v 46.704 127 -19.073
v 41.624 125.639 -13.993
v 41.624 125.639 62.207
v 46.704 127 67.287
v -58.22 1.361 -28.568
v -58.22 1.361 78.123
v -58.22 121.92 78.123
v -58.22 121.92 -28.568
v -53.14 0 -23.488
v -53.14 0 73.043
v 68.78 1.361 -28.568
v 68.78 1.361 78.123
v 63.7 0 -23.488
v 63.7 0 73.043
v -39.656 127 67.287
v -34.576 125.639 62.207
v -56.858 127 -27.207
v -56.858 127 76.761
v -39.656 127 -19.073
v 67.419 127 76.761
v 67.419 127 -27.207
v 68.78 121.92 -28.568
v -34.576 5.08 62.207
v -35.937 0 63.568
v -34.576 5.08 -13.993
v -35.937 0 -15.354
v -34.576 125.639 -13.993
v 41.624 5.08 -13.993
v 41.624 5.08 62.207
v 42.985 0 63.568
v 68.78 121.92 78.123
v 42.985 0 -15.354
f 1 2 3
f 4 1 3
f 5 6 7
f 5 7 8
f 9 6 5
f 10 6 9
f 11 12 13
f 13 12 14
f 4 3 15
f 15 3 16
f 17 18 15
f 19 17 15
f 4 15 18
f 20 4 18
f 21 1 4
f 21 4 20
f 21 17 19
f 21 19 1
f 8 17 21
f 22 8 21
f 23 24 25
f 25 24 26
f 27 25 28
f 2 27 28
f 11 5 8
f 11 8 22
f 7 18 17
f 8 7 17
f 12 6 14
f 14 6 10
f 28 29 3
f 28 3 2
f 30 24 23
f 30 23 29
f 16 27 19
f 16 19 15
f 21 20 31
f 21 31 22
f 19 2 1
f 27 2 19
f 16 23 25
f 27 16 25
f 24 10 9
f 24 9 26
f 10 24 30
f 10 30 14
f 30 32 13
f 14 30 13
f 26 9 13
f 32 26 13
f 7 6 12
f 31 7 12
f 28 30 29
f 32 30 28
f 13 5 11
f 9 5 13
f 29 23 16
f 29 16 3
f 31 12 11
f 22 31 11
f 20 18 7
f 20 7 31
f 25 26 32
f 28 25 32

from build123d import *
from OCP.BRepFilletAPI import BRepFilletAPI_MakeChamfer

# Parameters (mm, degrees)
SKETCH1_W           = 127
SKETCH1_H           = 106.690831556
BOSS_EXTRUDE1_DEPTH = 127
SKETCH3_W           = 76.2
SKETCH3_H           = 76.2
CUT_EXTRUDE1_DEPTH  = 165.203782008
CHAMFER1_SIZE       = 5.08
CHAMFER1_SIZE2      = 1.361181898


with BuildPart() as part:
    # Sketch1 → Boss-Extrude1 (new body)
    with BuildSketch(Plane(origin=(0, 0, 0), x_dir=(1, 0, 0), z_dir=(0, 1, 0))):
        with Locations((5.280383795, -24.777185501)):
            Rectangle(SKETCH1_W, SKETCH1_H)
    extrude(amount=BOSS_EXTRUDE1_DEPTH)

    # Sketch3 → Cut-Extrude1 (cut, through all)
    with BuildSketch(Plane(origin=(0, 0, 0), x_dir=(1, 0, 0), z_dir=(0, 1, 0))):
        with Locations((3.524009173, -24.106880488)):
            Rectangle(SKETCH3_W, SKETCH3_H)
    extrude(amount=CUT_EXTRUDE1_DEPTH, mode=Mode.SUBTRACT)

    # Chamfer1: one chamfer whose edges measure the first distance from different faces: ONE call of the kernel's chamfer builder (chamfer() names one face for all edges)
    chamfer1_edges_1 = [part.edges().sort_by_distance(p)[0] for p in [
        (68.780383795, 127, 24.777185501),
    ]]
    chamfer1_side_1 = [part.faces().sort_by_distance(p)[0] for p in [
        (68.780383795, 63.5, 24.777185501),
    ]]
    chamfer1_edges_2 = [part.edges().sort_by_distance(p)[0] for p in [
        (5.280383795, 127, -28.568230277),
    ]]
    chamfer1_side_2 = [part.faces().sort_by_distance(p)[0] for p in [
        (5.280383795, 63.5, -28.568230277),
    ]]
    chamfer1_edges_3 = [part.edges().sort_by_distance(p)[0] for p in [
        (41.624009173, 0, 24.106880488),
    ]]
    chamfer1_side_3 = [part.faces().sort_by_distance(p)[0] for p in [
        (41.624009173, 63.5, 24.106880488),
    ]]
    chamfer1_edges_4 = [part.edges().sort_by_distance(p)[0] for p in [
        (3.524009173, 0, -13.993119512),
    ]]
    chamfer1_side_4 = [part.faces().sort_by_distance(p)[0] for p in [
        (3.524009173, 63.5, -13.993119512),
    ]]
    chamfer1_edges_5 = [part.edges().sort_by_distance(p)[0] for p in [
        (-34.575990827, 0, 24.106880488),
    ]]
    chamfer1_side_5 = [part.faces().sort_by_distance(p)[0] for p in [
        (-34.575990827, 63.5, 24.106880488),
    ]]
    chamfer1_edges_6 = [part.edges().sort_by_distance(p)[0] for p in [
        (3.524009173, 0, 62.206880488),
    ]]
    chamfer1_side_6 = [part.faces().sort_by_distance(p)[0] for p in [
        (3.524009173, 63.5, 62.206880488),
    ]]
    chamfer1_edges_7 = [part.edges().sort_by_distance(p)[0] for p in [
        (41.624009173, 127, 24.106880488),
        (3.524009173, 127, -13.993119512),
        (-34.575990827, 127, 24.106880488),
        (3.524009173, 127, 62.206880488),
    ]]
    chamfer1_side_7 = [part.faces().sort_by_distance(p)[0] for p in [
        (5.280383795, 127, -26.909558111),
    ]]
    chamfer1_edges_8 = [part.edges().sort_by_distance(p)[0] for p in [
        (-58.219616205, 127, 24.777185501),
    ]]
    chamfer1_side_8 = [part.faces().sort_by_distance(p)[0] for p in [
        (-58.219616205, 63.5, 24.777185501),
    ]]
    chamfer1_edges_9 = [part.edges().sort_by_distance(p)[0] for p in [
        (5.280383795, 0, -28.568230277),
        (68.780383795, 0, 24.777185501),
        (5.280383795, 0, 78.122601279),
        (-58.219616205, 0, 24.777185501),
    ]]
    chamfer1_side_9 = [part.faces().sort_by_distance(p)[0] for p in [
        (5.280383795, 0, -26.909558111),
    ]]
    chamfer1_edges_10 = [part.edges().sort_by_distance(p)[0] for p in [
        (5.280383795, 127, 78.122601279),
    ]]
    chamfer1_side_10 = [part.faces().sort_by_distance(p)[0] for p in [
        (5.280383795, 63.5, 78.122601279),
    ]]
    chamfer1 = BRepFilletAPI_MakeChamfer(part.part.solid().wrapped)
    for e in chamfer1_edges_1:
        chamfer1.Add(CHAMFER1_SIZE, CHAMFER1_SIZE2, e.wrapped, chamfer1_side_1[0].wrapped)  # the first distance lies on this face
    for e in chamfer1_edges_2:
        chamfer1.Add(CHAMFER1_SIZE, CHAMFER1_SIZE2, e.wrapped, chamfer1_side_2[0].wrapped)  # the first distance lies on this face
    for e in chamfer1_edges_3:
        chamfer1.Add(CHAMFER1_SIZE, CHAMFER1_SIZE2, e.wrapped, chamfer1_side_3[0].wrapped)  # the first distance lies on this face
    for e in chamfer1_edges_4:
        chamfer1.Add(CHAMFER1_SIZE, CHAMFER1_SIZE2, e.wrapped, chamfer1_side_4[0].wrapped)  # the first distance lies on this face
    for e in chamfer1_edges_5:
        chamfer1.Add(CHAMFER1_SIZE, CHAMFER1_SIZE2, e.wrapped, chamfer1_side_5[0].wrapped)  # the first distance lies on this face
    for e in chamfer1_edges_6:
        chamfer1.Add(CHAMFER1_SIZE, CHAMFER1_SIZE2, e.wrapped, chamfer1_side_6[0].wrapped)  # the first distance lies on this face
    for e in chamfer1_edges_7:
        chamfer1.Add(CHAMFER1_SIZE, CHAMFER1_SIZE2, e.wrapped, chamfer1_side_7[0].wrapped)  # the first distance lies on this face
    for e in chamfer1_edges_8:
        chamfer1.Add(CHAMFER1_SIZE, CHAMFER1_SIZE2, e.wrapped, chamfer1_side_8[0].wrapped)  # the first distance lies on this face
    for e in chamfer1_edges_9:
        chamfer1.Add(CHAMFER1_SIZE, CHAMFER1_SIZE2, e.wrapped, chamfer1_side_9[0].wrapped)  # the first distance lies on this face
    for e in chamfer1_edges_10:
        chamfer1.Add(CHAMFER1_SIZE, CHAMFER1_SIZE2, e.wrapped, chamfer1_side_10[0].wrapped)  # the first distance lies on this face
    add(Compound.cast(chamfer1.Shape()), mode=Mode.REPLACE)


solid = part.part
